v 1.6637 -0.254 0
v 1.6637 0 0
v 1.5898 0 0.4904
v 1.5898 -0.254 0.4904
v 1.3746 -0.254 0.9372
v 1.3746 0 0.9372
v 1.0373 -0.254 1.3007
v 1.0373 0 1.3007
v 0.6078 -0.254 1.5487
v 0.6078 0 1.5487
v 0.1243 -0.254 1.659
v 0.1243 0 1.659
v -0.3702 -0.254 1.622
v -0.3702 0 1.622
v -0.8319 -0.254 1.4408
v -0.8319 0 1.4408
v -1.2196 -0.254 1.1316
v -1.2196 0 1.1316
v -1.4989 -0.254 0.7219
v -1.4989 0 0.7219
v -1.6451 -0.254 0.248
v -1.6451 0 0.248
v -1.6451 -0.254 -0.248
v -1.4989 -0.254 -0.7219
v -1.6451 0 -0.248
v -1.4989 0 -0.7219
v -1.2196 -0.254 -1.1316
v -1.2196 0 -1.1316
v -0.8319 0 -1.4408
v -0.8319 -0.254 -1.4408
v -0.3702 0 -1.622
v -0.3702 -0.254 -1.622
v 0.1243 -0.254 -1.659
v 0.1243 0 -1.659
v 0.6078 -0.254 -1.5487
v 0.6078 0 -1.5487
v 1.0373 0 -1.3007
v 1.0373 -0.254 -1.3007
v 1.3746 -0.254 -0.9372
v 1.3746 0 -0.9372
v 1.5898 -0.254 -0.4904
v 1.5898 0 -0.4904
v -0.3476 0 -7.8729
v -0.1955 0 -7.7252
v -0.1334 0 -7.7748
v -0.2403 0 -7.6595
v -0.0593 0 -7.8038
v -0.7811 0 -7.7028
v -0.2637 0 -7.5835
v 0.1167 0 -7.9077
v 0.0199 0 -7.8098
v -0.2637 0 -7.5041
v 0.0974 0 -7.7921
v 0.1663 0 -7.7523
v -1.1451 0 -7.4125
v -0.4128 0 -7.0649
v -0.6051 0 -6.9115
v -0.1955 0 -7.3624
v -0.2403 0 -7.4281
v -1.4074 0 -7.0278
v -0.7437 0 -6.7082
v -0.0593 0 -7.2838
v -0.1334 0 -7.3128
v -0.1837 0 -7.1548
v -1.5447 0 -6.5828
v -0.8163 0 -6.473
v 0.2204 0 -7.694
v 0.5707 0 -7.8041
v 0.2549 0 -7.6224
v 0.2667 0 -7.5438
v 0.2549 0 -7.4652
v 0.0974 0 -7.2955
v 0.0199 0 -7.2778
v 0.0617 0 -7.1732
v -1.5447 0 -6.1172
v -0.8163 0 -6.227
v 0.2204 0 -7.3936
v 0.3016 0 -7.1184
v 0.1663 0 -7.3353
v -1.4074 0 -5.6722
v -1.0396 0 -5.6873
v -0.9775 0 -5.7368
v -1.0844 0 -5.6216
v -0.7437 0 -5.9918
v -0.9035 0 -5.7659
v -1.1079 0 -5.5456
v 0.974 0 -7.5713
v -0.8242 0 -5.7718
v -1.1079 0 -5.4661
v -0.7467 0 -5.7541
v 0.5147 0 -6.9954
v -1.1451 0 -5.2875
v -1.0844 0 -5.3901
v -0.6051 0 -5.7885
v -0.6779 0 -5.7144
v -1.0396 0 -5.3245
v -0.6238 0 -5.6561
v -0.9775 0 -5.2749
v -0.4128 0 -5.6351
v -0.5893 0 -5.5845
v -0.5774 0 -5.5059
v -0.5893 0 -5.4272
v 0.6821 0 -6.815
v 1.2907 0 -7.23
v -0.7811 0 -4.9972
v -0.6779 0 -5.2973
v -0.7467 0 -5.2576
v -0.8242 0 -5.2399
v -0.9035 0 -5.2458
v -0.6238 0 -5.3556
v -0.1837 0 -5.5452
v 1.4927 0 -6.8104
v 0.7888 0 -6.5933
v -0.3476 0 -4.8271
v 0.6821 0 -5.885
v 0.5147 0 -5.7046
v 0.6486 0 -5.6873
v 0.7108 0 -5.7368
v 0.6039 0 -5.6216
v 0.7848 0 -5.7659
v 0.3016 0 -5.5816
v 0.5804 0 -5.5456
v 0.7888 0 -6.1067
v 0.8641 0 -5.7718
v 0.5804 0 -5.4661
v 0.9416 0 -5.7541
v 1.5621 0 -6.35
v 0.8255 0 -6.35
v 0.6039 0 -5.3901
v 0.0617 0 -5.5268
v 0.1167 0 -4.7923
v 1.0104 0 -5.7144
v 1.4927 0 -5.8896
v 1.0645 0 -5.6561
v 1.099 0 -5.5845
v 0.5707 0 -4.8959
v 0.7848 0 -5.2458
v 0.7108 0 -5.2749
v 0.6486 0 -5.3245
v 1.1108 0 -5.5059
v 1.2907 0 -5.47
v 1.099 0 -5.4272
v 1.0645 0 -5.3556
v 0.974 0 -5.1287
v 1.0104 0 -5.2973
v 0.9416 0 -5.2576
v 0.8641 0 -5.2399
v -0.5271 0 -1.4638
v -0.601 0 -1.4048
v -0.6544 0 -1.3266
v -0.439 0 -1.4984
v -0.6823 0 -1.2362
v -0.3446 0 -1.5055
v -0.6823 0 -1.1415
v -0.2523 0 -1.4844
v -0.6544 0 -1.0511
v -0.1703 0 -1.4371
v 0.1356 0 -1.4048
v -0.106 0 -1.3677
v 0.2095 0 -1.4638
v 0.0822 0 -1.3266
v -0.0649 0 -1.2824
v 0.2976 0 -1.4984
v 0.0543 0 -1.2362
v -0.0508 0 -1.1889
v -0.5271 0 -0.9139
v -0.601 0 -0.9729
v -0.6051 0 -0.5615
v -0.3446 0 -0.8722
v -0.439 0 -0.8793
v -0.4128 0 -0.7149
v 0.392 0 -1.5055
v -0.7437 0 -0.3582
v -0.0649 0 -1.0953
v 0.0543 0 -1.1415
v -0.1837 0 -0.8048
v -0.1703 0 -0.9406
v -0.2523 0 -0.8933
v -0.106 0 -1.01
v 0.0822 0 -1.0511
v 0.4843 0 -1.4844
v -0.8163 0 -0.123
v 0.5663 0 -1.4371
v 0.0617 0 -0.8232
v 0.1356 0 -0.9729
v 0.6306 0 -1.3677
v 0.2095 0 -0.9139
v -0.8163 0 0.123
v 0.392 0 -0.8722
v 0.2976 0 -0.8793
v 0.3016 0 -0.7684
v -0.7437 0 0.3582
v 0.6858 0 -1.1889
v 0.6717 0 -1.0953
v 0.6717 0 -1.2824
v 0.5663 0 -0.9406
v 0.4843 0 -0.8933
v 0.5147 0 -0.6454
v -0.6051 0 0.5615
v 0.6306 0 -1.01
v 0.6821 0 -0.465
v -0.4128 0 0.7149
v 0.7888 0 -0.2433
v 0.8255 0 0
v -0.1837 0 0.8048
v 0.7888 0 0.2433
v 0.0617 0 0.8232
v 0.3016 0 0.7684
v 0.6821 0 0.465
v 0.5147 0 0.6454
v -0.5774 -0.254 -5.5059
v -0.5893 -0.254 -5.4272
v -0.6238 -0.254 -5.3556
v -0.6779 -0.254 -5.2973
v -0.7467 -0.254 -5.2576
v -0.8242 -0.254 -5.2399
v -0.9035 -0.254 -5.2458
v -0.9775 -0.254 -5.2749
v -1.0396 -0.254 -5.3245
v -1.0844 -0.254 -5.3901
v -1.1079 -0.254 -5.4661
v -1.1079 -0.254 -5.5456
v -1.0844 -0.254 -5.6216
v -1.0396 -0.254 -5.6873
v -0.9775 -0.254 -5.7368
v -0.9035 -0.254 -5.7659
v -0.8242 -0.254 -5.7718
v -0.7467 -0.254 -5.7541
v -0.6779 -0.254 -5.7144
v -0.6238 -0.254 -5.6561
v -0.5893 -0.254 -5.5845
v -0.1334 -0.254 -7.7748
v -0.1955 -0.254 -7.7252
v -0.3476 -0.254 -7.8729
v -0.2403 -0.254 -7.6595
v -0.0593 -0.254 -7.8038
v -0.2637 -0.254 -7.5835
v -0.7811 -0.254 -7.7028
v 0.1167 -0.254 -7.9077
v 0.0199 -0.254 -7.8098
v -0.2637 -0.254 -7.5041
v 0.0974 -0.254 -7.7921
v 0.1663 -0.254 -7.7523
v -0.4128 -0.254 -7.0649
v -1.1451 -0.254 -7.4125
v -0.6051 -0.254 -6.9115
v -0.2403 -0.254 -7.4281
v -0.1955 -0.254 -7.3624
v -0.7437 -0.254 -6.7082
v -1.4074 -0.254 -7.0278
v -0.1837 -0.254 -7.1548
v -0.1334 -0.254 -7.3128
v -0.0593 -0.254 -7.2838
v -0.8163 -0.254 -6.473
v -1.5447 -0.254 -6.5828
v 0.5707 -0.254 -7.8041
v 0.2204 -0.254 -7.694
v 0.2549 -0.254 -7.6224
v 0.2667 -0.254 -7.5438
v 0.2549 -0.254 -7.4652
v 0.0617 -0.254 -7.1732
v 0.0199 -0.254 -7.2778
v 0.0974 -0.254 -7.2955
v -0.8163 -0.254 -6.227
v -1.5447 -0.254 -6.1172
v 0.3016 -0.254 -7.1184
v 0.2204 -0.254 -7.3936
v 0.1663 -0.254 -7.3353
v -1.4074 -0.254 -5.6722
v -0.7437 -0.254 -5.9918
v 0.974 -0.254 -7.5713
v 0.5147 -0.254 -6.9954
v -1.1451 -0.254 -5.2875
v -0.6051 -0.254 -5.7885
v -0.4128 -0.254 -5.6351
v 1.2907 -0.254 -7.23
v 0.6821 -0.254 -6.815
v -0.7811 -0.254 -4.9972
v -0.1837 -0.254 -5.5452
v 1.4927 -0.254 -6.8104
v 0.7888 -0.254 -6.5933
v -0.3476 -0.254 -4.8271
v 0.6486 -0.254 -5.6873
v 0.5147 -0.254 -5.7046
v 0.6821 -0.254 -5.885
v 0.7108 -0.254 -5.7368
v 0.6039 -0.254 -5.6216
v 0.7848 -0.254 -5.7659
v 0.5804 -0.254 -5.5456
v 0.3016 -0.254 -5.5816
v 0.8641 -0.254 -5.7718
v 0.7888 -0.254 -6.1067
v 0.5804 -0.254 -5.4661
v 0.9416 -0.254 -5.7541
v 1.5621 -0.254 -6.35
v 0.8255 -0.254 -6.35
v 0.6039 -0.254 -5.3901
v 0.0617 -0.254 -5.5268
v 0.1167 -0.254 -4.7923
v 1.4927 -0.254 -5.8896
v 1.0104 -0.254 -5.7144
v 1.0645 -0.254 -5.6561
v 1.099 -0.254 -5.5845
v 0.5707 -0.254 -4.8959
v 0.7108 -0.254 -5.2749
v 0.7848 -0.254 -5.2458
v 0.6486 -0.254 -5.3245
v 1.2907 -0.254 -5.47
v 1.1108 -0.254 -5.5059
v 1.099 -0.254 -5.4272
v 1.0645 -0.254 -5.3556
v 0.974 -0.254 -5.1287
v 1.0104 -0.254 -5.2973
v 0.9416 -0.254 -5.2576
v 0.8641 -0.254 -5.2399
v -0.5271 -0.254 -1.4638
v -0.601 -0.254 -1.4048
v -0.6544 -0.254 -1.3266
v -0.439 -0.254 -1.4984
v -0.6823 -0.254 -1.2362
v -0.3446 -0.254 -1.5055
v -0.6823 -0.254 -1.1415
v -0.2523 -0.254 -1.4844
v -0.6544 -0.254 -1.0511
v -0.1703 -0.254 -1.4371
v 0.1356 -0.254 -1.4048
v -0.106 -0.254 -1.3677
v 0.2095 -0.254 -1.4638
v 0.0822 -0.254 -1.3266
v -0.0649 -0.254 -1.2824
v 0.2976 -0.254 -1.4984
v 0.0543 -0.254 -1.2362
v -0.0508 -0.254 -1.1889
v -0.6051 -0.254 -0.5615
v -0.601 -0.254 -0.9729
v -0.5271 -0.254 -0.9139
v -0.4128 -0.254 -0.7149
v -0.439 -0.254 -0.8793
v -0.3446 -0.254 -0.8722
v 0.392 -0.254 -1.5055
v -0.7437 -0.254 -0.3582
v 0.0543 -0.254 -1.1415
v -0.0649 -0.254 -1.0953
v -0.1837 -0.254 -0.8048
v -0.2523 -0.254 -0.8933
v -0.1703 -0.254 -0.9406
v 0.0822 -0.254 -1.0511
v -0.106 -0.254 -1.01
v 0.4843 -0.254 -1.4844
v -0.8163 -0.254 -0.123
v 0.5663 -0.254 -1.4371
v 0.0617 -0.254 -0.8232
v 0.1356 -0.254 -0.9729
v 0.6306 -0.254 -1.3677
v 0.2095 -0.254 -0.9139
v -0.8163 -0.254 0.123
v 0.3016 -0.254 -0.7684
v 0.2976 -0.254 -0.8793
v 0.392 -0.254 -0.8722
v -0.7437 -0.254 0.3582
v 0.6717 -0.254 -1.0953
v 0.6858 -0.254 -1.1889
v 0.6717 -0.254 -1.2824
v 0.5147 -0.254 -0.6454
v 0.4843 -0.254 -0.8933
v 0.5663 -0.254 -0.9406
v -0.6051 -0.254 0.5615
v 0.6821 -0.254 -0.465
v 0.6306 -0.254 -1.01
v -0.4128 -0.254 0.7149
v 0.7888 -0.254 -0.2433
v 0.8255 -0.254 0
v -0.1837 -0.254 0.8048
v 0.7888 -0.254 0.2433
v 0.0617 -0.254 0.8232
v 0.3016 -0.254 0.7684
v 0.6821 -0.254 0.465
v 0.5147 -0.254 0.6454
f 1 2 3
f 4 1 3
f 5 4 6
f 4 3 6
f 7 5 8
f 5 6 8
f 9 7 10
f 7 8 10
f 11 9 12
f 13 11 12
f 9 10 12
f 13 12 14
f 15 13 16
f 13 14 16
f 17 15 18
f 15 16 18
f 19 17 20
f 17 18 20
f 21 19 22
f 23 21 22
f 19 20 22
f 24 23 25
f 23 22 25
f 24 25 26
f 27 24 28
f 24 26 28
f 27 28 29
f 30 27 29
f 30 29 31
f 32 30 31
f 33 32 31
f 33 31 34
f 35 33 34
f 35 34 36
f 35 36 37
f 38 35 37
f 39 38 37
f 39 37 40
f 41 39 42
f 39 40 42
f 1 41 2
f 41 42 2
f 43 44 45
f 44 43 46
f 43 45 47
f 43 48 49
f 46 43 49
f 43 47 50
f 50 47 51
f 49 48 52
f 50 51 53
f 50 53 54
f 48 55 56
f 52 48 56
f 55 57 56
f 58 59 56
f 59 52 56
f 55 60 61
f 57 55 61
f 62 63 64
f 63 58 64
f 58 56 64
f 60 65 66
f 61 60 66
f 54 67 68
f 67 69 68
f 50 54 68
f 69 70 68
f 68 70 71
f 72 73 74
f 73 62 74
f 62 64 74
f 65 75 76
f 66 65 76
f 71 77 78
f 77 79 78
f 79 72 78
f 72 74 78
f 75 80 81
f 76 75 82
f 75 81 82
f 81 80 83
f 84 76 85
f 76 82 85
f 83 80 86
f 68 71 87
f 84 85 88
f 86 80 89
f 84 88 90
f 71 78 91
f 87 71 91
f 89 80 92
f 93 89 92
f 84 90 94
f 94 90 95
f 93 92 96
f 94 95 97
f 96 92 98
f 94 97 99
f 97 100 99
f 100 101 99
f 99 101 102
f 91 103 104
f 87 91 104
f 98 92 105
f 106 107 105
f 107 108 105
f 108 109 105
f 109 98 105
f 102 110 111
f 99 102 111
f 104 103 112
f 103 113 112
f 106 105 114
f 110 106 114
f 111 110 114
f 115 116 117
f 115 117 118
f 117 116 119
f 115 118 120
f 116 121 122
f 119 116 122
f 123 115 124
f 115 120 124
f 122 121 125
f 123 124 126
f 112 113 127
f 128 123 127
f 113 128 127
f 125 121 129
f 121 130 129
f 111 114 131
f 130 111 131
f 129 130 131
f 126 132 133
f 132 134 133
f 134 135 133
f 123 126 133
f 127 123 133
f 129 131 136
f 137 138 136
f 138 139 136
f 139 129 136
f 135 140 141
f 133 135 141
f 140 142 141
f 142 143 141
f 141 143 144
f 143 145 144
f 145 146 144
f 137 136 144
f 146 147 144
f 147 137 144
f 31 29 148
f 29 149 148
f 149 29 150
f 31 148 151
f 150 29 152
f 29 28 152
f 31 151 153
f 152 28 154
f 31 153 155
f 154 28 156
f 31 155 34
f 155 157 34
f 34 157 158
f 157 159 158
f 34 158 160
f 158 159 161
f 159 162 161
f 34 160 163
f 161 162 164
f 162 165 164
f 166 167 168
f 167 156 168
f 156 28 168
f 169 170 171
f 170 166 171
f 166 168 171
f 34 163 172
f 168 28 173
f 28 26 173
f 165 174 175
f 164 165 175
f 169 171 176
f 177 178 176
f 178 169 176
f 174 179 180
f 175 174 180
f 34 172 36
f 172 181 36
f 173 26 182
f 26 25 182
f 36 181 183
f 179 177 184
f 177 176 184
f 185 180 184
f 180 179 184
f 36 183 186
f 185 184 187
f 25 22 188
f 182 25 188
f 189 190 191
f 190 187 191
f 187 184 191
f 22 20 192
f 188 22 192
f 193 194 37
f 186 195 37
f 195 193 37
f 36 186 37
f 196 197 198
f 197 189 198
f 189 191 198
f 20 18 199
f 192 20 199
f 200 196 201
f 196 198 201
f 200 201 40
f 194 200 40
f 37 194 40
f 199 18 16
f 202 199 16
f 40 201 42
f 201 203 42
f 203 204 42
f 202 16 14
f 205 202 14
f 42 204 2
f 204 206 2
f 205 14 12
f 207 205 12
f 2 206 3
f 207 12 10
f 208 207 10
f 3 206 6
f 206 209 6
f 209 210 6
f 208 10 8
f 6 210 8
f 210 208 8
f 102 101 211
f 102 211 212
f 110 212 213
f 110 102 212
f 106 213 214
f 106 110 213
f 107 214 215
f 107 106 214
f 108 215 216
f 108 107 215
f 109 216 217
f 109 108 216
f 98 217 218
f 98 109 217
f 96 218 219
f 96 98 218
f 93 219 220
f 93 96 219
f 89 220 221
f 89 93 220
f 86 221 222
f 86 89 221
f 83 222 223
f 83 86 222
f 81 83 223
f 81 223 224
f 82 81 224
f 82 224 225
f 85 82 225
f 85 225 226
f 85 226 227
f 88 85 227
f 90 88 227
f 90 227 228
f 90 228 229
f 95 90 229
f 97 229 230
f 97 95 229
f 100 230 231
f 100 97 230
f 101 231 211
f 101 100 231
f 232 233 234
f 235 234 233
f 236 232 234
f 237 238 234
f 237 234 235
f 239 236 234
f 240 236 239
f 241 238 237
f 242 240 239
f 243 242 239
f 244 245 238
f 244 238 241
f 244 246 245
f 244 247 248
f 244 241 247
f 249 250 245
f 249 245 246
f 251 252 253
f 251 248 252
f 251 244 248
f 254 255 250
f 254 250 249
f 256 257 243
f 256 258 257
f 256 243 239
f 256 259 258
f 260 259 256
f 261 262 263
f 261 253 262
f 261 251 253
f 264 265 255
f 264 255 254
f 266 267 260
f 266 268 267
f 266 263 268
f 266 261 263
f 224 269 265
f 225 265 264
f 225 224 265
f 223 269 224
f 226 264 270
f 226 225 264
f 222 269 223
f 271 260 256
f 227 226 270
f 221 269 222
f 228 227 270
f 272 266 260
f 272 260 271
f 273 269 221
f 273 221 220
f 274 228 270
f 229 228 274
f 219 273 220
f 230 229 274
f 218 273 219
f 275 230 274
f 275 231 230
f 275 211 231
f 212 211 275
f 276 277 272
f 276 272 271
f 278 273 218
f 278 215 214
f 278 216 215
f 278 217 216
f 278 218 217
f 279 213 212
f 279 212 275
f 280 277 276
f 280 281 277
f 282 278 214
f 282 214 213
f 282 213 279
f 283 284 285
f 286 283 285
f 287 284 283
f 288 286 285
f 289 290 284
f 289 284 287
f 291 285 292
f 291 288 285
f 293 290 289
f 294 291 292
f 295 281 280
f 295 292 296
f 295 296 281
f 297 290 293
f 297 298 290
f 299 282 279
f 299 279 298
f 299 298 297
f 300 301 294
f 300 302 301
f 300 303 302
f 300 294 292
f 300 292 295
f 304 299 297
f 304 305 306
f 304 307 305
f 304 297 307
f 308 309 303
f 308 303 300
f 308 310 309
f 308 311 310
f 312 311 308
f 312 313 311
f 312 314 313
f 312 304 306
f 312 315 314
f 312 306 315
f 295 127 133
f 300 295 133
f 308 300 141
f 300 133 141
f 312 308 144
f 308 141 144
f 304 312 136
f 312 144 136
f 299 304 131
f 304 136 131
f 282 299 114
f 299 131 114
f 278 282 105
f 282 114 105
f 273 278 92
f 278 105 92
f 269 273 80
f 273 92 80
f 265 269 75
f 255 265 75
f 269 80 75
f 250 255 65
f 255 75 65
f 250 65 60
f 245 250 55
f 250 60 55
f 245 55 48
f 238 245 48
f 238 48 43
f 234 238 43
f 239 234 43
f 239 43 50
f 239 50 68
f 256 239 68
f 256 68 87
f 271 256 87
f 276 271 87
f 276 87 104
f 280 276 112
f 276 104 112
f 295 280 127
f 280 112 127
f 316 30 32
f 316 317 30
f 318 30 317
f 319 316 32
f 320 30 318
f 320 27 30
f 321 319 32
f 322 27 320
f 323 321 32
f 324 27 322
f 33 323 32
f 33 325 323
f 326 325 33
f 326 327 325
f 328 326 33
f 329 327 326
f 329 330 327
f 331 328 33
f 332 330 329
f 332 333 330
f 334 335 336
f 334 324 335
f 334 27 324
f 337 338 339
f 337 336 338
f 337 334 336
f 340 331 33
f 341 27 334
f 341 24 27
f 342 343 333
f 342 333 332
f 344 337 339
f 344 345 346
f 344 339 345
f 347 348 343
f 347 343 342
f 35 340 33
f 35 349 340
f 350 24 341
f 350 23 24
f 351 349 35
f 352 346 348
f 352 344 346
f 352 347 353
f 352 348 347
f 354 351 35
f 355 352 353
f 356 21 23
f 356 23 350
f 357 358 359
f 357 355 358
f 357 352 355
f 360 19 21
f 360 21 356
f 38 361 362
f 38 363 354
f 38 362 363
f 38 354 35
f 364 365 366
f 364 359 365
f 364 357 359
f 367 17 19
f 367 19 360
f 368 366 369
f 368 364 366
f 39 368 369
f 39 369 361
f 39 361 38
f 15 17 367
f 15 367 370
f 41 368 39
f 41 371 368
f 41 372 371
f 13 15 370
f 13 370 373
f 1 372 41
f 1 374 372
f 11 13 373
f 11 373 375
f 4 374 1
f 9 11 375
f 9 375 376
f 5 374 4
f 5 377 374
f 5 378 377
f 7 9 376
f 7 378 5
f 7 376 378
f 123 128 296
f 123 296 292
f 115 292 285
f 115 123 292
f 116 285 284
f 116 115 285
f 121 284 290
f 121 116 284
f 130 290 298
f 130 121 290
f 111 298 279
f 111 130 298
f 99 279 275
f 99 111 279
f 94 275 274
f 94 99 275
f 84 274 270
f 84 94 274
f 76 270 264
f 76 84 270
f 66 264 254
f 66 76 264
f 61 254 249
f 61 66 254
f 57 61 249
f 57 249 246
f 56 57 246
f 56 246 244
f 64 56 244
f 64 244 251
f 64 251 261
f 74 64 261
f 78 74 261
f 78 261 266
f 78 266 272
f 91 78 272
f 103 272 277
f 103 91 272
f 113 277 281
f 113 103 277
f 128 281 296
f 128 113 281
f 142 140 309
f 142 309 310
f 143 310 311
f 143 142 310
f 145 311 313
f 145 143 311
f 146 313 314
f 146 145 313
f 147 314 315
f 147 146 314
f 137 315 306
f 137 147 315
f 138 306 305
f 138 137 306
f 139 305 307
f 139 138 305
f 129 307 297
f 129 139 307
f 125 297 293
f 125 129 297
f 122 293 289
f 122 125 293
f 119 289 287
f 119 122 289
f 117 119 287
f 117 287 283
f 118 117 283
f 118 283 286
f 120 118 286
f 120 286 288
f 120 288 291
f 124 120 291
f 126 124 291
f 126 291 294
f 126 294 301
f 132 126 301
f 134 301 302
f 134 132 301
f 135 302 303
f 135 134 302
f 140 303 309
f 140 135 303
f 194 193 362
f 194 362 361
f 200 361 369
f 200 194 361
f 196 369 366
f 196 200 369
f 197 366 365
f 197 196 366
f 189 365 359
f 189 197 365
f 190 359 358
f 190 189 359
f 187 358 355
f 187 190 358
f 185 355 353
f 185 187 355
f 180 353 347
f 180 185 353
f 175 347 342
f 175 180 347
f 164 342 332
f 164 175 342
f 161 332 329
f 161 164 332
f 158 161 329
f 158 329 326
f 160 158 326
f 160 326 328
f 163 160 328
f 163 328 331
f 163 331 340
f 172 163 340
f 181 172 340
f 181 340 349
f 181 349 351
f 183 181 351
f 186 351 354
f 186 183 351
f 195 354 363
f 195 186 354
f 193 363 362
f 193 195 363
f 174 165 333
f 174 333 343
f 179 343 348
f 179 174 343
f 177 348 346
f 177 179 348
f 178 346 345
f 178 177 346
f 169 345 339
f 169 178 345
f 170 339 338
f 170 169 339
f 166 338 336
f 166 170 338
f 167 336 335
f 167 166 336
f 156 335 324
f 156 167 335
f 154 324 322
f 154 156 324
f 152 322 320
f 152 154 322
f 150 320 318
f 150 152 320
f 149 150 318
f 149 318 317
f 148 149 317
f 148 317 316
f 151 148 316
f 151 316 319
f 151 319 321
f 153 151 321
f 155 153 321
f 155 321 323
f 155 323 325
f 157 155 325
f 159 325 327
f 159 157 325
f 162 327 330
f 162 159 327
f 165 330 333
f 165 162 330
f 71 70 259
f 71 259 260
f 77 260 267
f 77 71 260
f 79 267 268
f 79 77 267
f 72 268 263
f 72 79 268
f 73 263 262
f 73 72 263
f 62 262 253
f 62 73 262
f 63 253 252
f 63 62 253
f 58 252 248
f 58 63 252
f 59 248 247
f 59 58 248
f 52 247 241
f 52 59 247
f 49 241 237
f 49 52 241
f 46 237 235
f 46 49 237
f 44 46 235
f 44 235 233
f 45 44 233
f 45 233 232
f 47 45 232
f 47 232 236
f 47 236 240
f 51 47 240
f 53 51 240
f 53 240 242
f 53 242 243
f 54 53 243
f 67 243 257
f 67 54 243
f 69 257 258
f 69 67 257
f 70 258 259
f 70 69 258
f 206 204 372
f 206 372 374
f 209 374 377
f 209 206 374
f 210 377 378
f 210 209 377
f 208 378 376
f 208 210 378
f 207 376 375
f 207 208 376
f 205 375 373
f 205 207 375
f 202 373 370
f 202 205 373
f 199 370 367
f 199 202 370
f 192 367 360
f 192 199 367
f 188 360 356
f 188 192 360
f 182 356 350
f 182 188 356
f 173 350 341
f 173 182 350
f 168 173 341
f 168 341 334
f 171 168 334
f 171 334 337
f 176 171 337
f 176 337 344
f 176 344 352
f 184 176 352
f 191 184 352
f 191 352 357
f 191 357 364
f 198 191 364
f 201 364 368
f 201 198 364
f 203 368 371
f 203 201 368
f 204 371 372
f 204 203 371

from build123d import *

# Parameters (mm, degrees)
F0_R     = 1.6637
F0_R_2   = 0.3175
F0_R_3   = 0.8255
F0_R_4   = 1.5621
F0_R_5   = 0.2667
F1_DEPTH = 0.254


with BuildPart() as f1:
    # F0 (on Front) → F1 (new body)
    with BuildSketch(Plane.XZ):
        Circle(F0_R)
        with Locations((-0.3683, -1.188858)):
            Circle(F0_R_2, mode=Mode.SUBTRACT)
        Circle(F0_R_3, mode=Mode.SUBTRACT)
        with Locations((0.3683, -1.188858)):
            Circle(F0_R_2, mode=Mode.SUBTRACT)
        with Locations((0, -6.35)):
            Circle(F0_R_4)
        with Locations((0, -7.5438)):
            Circle(F0_R_5, mode=Mode.SUBTRACT)
        with Locations((0, -6.35)):
            Circle(F0_R_3, mode=Mode.SUBTRACT)
        with Locations((-0.844144, -5.505856)):
            Circle(F0_R_5, mode=Mode.SUBTRACT)
        with Locations((0.844144, -5.505856)):
            Circle(F0_R_5, mode=Mode.SUBTRACT)
    extrude(amount=F1_DEPTH)


solid = f1.part
